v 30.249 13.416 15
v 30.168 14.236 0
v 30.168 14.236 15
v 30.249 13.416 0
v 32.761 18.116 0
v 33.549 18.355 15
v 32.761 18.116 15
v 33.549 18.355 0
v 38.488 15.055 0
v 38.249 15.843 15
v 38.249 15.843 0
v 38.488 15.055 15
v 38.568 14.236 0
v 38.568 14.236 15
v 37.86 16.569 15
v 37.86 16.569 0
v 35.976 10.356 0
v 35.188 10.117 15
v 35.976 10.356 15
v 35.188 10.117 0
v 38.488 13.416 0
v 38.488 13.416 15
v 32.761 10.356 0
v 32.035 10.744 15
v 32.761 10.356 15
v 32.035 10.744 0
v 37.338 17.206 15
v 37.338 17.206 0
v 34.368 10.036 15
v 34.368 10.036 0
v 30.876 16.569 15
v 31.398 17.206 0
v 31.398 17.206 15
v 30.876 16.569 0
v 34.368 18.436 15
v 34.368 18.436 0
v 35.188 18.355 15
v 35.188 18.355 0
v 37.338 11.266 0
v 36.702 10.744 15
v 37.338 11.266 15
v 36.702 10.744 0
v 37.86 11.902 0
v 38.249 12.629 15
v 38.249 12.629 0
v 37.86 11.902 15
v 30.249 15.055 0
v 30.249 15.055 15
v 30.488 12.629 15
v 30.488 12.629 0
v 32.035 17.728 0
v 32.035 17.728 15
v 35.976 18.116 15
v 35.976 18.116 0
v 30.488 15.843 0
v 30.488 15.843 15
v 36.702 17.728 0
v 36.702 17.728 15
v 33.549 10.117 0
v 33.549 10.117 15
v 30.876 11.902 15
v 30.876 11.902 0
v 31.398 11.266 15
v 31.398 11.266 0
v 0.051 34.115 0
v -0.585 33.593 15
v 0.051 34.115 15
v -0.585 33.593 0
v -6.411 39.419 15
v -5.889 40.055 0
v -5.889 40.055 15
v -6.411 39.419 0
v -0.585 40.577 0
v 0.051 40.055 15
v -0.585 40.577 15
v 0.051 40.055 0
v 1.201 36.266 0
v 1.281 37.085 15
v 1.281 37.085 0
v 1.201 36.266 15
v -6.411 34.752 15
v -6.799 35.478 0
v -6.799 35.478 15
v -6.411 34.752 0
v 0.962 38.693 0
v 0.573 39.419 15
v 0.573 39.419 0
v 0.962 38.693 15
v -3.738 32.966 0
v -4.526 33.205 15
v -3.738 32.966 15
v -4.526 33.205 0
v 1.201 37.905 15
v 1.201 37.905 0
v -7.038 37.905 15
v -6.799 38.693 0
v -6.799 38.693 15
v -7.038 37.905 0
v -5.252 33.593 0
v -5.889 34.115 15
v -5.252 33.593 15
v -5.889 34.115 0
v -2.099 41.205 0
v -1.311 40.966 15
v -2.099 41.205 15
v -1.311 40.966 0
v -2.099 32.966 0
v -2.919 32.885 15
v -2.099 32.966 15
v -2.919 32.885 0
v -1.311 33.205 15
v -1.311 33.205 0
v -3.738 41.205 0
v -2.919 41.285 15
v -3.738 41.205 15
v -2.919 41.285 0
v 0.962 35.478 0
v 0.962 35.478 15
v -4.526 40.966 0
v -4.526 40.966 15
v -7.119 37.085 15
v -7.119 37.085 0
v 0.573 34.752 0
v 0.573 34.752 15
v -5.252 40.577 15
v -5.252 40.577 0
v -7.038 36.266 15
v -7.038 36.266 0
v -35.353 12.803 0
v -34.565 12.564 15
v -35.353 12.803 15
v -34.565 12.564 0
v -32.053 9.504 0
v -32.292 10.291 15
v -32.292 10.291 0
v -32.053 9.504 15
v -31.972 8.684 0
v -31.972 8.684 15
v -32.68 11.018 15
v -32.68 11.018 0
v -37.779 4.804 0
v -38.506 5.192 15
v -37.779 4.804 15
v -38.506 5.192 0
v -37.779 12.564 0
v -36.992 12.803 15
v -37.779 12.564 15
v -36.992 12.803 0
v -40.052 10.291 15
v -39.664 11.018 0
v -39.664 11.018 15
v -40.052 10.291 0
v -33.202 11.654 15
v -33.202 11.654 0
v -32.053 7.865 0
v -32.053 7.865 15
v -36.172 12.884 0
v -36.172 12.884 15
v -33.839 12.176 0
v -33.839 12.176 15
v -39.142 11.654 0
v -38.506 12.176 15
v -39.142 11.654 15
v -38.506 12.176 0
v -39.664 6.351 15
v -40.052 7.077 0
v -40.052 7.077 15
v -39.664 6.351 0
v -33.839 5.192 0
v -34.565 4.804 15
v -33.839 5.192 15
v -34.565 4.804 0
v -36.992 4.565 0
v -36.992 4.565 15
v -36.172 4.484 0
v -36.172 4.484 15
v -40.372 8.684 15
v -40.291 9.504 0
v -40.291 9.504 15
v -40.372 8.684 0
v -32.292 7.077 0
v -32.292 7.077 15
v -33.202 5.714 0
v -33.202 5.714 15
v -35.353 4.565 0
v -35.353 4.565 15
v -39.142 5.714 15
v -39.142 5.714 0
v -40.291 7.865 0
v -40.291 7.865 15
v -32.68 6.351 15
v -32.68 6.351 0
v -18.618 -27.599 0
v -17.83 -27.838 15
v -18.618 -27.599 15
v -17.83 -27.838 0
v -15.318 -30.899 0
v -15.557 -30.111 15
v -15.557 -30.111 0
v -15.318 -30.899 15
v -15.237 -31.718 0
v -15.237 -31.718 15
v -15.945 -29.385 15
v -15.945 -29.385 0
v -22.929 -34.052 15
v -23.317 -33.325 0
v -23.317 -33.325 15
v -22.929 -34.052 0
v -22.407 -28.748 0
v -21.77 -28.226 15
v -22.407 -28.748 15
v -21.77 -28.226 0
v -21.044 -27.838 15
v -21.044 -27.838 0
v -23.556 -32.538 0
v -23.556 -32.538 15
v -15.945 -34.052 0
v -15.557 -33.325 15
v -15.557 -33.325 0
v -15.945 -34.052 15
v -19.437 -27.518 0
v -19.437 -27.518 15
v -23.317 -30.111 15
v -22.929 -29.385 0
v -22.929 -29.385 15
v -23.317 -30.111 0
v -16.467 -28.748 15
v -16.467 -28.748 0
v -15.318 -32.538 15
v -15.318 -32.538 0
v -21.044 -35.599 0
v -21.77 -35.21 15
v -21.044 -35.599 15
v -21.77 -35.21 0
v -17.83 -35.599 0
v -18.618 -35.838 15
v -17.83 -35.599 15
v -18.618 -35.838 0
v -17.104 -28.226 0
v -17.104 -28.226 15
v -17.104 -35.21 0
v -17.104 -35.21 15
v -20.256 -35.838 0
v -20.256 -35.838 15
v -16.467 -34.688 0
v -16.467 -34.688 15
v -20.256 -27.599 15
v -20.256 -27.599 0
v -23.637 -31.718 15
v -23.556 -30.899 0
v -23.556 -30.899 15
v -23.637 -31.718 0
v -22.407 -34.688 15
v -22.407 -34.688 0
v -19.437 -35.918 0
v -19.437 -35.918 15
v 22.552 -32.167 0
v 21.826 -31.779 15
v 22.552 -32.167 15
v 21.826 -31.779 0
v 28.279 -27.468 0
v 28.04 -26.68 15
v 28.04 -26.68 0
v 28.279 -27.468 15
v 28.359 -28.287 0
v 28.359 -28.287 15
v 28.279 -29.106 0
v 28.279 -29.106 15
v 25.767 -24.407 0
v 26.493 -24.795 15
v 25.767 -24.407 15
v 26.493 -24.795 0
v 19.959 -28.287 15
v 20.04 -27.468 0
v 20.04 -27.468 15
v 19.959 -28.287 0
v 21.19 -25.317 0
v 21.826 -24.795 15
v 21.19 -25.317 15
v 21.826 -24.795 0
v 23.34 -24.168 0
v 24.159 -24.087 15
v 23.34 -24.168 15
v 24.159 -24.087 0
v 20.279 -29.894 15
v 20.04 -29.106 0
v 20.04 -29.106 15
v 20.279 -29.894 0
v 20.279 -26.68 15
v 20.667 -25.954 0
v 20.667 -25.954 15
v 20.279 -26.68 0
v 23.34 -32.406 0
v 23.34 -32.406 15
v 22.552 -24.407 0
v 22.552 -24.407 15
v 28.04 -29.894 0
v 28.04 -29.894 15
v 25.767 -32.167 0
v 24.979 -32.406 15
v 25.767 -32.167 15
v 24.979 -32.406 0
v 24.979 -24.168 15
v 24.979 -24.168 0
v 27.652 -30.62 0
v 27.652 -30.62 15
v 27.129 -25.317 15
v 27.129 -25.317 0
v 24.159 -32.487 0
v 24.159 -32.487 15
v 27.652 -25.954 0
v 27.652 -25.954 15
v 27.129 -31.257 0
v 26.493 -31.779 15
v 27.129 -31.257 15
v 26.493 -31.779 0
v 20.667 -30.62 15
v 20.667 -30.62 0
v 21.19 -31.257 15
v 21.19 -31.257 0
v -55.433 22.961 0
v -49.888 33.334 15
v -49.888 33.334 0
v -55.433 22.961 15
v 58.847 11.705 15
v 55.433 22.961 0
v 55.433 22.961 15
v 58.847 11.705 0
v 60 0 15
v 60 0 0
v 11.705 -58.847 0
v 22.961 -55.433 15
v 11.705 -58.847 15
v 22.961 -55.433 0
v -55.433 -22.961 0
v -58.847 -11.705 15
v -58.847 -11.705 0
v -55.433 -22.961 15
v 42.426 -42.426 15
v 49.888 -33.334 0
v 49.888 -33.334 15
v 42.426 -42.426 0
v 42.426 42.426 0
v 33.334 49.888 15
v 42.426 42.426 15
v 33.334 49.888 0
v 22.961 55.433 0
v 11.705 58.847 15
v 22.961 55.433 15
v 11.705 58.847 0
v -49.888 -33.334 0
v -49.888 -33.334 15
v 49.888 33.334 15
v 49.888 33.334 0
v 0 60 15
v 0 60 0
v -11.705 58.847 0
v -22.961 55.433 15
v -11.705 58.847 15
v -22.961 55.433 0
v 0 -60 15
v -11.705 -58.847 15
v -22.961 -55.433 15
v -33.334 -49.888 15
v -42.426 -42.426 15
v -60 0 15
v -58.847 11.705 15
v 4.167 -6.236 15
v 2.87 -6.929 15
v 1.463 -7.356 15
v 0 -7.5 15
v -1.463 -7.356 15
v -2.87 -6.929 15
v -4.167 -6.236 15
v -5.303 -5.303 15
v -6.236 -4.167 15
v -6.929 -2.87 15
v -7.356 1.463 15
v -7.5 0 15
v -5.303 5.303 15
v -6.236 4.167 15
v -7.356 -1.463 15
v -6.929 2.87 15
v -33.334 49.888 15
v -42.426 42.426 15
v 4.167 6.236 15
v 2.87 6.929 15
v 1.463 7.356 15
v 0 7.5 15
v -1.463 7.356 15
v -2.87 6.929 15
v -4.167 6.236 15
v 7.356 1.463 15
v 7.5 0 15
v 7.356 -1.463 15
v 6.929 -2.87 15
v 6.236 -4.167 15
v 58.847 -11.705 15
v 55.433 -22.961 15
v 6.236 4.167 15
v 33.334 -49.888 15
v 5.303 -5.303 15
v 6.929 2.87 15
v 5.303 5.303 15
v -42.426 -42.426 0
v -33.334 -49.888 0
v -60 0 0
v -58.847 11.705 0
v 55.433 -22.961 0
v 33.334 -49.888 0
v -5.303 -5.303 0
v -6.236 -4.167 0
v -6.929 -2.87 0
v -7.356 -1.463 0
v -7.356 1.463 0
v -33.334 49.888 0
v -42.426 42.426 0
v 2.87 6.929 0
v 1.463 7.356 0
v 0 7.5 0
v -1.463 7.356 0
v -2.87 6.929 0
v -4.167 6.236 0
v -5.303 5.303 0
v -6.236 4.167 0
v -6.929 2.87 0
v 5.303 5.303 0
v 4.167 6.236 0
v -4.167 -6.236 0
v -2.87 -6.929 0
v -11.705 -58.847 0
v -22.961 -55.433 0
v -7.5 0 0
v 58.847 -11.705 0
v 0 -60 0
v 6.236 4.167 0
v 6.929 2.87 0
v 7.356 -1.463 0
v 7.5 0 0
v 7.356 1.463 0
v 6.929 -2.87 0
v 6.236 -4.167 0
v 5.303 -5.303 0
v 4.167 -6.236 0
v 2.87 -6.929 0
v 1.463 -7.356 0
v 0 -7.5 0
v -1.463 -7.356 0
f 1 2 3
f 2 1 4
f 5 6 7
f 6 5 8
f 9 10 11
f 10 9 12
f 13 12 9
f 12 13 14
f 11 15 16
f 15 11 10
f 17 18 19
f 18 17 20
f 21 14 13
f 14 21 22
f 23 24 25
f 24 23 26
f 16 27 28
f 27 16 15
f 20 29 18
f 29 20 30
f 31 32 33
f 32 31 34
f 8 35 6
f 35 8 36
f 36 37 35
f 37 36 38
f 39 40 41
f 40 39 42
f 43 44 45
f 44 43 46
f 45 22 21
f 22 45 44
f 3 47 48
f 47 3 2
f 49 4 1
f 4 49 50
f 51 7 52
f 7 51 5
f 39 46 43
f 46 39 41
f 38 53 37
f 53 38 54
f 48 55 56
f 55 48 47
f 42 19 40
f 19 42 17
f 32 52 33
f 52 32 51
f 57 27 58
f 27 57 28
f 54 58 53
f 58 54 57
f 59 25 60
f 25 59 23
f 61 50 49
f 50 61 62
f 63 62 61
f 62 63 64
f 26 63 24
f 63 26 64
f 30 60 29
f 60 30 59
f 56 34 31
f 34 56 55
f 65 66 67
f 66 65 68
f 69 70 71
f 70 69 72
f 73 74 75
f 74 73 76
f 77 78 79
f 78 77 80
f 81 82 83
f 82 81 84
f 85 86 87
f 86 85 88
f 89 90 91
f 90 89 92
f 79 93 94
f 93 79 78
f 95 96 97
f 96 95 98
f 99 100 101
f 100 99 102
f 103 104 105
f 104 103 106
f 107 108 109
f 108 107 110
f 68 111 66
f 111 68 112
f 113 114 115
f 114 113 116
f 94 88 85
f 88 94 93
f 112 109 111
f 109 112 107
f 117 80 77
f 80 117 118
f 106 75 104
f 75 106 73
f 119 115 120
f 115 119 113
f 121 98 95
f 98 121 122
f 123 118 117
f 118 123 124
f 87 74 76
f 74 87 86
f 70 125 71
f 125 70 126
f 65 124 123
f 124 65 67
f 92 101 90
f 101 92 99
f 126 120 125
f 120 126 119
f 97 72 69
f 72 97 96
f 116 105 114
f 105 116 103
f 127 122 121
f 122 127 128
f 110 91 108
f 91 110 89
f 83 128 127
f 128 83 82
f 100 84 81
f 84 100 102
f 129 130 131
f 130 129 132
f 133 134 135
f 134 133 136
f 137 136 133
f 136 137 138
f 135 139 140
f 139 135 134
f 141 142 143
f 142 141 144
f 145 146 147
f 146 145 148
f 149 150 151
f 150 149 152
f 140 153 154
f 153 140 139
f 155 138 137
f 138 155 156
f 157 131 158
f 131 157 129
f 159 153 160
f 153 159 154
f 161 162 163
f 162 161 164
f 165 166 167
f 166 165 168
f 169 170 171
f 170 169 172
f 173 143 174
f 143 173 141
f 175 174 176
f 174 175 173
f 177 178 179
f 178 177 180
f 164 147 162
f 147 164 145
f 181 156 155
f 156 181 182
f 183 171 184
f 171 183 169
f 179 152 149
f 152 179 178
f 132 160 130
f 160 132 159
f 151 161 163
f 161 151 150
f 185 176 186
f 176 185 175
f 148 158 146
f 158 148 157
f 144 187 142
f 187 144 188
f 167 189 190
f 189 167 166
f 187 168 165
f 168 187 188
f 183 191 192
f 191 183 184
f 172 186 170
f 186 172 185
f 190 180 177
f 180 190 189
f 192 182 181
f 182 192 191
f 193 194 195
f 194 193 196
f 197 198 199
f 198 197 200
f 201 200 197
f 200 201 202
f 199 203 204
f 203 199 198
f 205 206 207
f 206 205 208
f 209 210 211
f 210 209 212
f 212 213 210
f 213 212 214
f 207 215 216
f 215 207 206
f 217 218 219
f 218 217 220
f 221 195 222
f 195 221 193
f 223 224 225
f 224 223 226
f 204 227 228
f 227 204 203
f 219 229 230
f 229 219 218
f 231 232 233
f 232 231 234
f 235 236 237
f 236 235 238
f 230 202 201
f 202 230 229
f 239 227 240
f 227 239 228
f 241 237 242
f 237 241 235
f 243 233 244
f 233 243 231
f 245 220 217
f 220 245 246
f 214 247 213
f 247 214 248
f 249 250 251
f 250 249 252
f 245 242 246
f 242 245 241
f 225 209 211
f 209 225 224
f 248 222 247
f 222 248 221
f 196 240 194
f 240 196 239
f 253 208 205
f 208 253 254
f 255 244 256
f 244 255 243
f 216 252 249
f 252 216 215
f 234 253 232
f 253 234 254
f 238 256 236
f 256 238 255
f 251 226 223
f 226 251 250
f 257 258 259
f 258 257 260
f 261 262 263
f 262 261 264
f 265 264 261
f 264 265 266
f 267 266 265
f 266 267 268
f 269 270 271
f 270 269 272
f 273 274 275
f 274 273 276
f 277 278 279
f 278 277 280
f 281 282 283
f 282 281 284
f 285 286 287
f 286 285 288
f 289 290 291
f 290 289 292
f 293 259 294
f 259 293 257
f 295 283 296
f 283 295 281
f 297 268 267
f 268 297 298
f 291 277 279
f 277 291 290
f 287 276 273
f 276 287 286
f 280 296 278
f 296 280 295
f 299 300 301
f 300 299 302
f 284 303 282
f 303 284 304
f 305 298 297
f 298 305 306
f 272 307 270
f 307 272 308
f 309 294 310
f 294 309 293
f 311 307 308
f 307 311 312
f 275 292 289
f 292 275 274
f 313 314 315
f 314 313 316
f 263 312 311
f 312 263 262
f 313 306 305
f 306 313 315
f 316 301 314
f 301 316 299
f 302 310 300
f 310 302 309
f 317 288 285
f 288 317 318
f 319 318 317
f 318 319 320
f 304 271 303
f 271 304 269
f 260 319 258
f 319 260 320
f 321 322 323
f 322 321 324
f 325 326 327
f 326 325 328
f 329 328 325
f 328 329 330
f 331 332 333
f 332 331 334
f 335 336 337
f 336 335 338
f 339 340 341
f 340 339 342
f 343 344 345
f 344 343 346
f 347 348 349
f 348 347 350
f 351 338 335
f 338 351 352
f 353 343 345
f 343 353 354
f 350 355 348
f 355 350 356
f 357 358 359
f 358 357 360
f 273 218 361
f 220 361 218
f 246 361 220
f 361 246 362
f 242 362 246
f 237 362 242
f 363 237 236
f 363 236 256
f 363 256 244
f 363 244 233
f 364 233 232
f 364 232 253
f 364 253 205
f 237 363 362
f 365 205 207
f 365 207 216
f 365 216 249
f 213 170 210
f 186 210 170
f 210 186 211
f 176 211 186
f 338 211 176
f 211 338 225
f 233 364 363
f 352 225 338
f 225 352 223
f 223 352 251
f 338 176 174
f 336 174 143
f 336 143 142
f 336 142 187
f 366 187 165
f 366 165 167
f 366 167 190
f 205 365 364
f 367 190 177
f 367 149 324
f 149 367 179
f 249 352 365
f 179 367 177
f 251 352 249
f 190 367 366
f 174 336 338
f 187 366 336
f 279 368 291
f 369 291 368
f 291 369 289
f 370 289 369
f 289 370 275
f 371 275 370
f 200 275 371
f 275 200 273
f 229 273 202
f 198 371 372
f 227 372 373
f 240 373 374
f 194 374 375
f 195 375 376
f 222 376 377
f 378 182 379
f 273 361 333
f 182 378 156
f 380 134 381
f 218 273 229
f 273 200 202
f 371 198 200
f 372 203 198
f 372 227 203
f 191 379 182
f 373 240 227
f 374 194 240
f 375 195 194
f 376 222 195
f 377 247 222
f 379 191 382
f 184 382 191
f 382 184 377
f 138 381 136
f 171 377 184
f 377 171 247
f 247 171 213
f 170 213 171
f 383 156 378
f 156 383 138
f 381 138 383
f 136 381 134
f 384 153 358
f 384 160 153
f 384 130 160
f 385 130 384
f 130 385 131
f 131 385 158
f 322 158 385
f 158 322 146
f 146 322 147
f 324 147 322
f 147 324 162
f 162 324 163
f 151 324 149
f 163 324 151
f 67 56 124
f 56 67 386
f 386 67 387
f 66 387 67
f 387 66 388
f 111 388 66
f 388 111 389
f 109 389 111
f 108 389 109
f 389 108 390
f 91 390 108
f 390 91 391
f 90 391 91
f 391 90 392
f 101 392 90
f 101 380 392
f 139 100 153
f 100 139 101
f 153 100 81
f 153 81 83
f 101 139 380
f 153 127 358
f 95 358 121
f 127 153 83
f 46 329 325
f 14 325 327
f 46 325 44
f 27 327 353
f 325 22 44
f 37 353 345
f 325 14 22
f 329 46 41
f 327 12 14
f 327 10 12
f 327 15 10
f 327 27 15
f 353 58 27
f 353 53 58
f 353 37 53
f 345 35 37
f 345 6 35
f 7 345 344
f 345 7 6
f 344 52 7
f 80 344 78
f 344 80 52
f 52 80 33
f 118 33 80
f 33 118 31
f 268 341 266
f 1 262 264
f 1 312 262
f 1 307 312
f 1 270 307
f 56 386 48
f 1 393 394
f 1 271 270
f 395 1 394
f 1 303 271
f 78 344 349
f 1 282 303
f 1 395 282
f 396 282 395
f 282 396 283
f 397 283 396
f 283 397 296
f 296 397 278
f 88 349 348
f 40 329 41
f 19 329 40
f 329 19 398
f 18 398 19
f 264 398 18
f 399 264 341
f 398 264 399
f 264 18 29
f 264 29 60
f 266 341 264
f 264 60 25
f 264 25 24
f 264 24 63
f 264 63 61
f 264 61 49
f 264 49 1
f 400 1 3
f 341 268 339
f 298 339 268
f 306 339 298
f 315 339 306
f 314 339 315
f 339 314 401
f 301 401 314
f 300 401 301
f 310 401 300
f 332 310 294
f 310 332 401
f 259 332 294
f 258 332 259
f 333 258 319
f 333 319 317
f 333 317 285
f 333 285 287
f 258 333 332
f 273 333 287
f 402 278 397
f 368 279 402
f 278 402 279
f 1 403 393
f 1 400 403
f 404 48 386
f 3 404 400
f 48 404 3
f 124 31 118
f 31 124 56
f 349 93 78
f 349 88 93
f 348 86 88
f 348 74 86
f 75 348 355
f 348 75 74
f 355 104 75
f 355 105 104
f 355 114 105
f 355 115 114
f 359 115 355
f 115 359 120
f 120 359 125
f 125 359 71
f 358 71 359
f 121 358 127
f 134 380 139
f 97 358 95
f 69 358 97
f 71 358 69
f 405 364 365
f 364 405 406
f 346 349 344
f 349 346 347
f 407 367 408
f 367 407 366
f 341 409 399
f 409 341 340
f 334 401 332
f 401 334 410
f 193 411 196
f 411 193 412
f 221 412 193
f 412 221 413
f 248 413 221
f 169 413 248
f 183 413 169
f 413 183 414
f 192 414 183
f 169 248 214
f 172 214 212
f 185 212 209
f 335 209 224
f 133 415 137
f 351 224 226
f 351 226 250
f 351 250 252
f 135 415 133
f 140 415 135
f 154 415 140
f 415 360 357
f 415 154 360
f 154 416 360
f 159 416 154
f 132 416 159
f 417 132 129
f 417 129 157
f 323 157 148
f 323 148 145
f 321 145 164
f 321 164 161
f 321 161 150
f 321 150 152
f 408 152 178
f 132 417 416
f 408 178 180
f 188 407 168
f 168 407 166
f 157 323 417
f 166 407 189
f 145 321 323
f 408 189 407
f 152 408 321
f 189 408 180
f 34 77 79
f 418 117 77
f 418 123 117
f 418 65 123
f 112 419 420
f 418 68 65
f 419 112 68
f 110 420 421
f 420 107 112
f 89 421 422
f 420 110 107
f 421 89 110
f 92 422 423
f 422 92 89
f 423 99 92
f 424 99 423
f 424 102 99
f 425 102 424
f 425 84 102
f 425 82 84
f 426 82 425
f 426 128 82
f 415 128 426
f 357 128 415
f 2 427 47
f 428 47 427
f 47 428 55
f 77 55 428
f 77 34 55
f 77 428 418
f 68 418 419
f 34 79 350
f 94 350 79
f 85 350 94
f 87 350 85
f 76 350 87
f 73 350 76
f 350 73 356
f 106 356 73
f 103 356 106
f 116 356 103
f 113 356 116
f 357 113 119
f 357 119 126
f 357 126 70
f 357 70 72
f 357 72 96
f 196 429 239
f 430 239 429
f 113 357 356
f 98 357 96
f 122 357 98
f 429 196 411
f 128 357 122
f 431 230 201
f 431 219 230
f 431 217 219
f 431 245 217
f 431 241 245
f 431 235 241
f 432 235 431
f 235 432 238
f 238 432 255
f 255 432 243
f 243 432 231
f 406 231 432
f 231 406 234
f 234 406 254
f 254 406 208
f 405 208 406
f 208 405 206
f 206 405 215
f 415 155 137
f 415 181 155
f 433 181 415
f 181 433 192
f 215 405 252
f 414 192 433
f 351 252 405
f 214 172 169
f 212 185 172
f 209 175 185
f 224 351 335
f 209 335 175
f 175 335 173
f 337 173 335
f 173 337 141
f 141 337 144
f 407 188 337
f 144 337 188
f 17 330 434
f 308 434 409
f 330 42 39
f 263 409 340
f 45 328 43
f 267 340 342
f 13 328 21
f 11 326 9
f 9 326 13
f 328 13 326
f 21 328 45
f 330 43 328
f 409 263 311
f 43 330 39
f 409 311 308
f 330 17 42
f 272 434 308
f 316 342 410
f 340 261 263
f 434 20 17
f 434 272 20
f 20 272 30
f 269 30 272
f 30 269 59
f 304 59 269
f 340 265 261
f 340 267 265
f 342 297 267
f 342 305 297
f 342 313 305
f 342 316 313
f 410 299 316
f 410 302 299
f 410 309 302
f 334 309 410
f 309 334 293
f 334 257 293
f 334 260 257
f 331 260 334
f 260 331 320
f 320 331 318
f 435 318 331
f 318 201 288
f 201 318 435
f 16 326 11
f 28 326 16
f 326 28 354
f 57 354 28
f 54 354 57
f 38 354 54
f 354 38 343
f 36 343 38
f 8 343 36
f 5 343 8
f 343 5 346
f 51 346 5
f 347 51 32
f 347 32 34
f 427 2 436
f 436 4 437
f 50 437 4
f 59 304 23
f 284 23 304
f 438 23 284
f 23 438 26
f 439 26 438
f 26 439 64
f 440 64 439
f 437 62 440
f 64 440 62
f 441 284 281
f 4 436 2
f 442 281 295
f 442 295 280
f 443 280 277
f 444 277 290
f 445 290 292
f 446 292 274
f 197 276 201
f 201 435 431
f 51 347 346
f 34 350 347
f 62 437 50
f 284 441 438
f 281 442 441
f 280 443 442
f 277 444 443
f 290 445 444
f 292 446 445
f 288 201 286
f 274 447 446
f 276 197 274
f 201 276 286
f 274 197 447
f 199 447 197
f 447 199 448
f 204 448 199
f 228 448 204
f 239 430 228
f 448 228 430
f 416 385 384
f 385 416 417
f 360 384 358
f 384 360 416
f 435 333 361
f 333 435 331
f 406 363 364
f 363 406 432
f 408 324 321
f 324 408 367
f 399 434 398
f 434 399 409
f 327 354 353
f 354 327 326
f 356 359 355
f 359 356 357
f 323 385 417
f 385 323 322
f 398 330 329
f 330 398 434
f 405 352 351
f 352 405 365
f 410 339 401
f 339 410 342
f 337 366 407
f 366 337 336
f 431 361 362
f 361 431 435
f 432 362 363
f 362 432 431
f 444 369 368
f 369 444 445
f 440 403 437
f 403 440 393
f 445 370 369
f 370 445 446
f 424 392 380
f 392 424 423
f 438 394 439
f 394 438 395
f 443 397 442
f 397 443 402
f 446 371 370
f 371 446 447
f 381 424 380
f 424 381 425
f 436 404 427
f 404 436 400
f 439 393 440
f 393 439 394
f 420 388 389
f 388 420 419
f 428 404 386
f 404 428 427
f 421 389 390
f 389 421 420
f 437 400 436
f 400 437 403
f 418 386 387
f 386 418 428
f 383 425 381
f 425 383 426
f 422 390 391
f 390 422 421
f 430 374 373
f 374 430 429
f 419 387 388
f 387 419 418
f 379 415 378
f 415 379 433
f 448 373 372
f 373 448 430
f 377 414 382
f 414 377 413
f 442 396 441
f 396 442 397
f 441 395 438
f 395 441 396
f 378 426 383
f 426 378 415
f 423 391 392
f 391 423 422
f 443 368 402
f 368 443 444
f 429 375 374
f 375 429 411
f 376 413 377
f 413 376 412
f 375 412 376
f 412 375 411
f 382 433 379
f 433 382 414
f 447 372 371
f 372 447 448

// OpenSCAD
$fn = 32;

// ----------------------------------------------------------------------
// Flange Ø120 x 15
// 5 holes on a Ø74.4 bolt circle, bolted joints
// ----------------------------------------------------------------------

// --- parameters (mm) ---
flange_d = 120;    // outside diameter of the flange
seat_tol = 0.05;   // tolerance at the seating features
free_tol = 0.3;    // general tolerance on the free sizes
thickness = 15;    // flange thickness
holes = 5;         // number of bolt holes
pcd = 74.4;        // bolt circle diameter
start_deg = 22.5;  // angle of the first hole, from +X
hole_d = 8.4;      // bolt hole diameter
bore_d = 15;       // central through bore
hub_d = 27;        // hub outside diameter
hub_h = 0;         // hub height above the flange face (0 = no hub)

// --- derived feature positions (mm) ---
height = thickness + hub_h;  // = 15   overall height of the part
pcd_r = pcd / 2;             // = 37.2   bolt circle radius
hole_step = 360 / holes;     // = 72   angular pitch
feature_centers = [
  [pcd_r * cos(start_deg + 0 * hole_step), pcd_r * sin(start_deg + 0 * hole_step)],
  [pcd_r * cos(start_deg + 1 * hole_step), pcd_r * sin(start_deg + 1 * hole_step)],
  [pcd_r * cos(start_deg + 2 * hole_step), pcd_r * sin(start_deg + 2 * hole_step)],
  [pcd_r * cos(start_deg + 3 * hole_step), pcd_r * sin(start_deg + 3 * hole_step)],
  [pcd_r * cos(start_deg + 4 * hole_step), pcd_r * sin(start_deg + 4 * hole_step)]
];   // bolt hole centres on the pitch circle

// flange disc, every hole and the bore cut straight through
difference() {
  union() {
    cylinder(d = flange_d, h = thickness);
  }
  translate([0, 0, -1]) cylinder(d = bore_d, h = height + 2);  // bore, through
  for (centre = feature_centers)
    translate([centre[0], centre[1], -1]) cylinder(d = hole_d, h = thickness + 2);
}
